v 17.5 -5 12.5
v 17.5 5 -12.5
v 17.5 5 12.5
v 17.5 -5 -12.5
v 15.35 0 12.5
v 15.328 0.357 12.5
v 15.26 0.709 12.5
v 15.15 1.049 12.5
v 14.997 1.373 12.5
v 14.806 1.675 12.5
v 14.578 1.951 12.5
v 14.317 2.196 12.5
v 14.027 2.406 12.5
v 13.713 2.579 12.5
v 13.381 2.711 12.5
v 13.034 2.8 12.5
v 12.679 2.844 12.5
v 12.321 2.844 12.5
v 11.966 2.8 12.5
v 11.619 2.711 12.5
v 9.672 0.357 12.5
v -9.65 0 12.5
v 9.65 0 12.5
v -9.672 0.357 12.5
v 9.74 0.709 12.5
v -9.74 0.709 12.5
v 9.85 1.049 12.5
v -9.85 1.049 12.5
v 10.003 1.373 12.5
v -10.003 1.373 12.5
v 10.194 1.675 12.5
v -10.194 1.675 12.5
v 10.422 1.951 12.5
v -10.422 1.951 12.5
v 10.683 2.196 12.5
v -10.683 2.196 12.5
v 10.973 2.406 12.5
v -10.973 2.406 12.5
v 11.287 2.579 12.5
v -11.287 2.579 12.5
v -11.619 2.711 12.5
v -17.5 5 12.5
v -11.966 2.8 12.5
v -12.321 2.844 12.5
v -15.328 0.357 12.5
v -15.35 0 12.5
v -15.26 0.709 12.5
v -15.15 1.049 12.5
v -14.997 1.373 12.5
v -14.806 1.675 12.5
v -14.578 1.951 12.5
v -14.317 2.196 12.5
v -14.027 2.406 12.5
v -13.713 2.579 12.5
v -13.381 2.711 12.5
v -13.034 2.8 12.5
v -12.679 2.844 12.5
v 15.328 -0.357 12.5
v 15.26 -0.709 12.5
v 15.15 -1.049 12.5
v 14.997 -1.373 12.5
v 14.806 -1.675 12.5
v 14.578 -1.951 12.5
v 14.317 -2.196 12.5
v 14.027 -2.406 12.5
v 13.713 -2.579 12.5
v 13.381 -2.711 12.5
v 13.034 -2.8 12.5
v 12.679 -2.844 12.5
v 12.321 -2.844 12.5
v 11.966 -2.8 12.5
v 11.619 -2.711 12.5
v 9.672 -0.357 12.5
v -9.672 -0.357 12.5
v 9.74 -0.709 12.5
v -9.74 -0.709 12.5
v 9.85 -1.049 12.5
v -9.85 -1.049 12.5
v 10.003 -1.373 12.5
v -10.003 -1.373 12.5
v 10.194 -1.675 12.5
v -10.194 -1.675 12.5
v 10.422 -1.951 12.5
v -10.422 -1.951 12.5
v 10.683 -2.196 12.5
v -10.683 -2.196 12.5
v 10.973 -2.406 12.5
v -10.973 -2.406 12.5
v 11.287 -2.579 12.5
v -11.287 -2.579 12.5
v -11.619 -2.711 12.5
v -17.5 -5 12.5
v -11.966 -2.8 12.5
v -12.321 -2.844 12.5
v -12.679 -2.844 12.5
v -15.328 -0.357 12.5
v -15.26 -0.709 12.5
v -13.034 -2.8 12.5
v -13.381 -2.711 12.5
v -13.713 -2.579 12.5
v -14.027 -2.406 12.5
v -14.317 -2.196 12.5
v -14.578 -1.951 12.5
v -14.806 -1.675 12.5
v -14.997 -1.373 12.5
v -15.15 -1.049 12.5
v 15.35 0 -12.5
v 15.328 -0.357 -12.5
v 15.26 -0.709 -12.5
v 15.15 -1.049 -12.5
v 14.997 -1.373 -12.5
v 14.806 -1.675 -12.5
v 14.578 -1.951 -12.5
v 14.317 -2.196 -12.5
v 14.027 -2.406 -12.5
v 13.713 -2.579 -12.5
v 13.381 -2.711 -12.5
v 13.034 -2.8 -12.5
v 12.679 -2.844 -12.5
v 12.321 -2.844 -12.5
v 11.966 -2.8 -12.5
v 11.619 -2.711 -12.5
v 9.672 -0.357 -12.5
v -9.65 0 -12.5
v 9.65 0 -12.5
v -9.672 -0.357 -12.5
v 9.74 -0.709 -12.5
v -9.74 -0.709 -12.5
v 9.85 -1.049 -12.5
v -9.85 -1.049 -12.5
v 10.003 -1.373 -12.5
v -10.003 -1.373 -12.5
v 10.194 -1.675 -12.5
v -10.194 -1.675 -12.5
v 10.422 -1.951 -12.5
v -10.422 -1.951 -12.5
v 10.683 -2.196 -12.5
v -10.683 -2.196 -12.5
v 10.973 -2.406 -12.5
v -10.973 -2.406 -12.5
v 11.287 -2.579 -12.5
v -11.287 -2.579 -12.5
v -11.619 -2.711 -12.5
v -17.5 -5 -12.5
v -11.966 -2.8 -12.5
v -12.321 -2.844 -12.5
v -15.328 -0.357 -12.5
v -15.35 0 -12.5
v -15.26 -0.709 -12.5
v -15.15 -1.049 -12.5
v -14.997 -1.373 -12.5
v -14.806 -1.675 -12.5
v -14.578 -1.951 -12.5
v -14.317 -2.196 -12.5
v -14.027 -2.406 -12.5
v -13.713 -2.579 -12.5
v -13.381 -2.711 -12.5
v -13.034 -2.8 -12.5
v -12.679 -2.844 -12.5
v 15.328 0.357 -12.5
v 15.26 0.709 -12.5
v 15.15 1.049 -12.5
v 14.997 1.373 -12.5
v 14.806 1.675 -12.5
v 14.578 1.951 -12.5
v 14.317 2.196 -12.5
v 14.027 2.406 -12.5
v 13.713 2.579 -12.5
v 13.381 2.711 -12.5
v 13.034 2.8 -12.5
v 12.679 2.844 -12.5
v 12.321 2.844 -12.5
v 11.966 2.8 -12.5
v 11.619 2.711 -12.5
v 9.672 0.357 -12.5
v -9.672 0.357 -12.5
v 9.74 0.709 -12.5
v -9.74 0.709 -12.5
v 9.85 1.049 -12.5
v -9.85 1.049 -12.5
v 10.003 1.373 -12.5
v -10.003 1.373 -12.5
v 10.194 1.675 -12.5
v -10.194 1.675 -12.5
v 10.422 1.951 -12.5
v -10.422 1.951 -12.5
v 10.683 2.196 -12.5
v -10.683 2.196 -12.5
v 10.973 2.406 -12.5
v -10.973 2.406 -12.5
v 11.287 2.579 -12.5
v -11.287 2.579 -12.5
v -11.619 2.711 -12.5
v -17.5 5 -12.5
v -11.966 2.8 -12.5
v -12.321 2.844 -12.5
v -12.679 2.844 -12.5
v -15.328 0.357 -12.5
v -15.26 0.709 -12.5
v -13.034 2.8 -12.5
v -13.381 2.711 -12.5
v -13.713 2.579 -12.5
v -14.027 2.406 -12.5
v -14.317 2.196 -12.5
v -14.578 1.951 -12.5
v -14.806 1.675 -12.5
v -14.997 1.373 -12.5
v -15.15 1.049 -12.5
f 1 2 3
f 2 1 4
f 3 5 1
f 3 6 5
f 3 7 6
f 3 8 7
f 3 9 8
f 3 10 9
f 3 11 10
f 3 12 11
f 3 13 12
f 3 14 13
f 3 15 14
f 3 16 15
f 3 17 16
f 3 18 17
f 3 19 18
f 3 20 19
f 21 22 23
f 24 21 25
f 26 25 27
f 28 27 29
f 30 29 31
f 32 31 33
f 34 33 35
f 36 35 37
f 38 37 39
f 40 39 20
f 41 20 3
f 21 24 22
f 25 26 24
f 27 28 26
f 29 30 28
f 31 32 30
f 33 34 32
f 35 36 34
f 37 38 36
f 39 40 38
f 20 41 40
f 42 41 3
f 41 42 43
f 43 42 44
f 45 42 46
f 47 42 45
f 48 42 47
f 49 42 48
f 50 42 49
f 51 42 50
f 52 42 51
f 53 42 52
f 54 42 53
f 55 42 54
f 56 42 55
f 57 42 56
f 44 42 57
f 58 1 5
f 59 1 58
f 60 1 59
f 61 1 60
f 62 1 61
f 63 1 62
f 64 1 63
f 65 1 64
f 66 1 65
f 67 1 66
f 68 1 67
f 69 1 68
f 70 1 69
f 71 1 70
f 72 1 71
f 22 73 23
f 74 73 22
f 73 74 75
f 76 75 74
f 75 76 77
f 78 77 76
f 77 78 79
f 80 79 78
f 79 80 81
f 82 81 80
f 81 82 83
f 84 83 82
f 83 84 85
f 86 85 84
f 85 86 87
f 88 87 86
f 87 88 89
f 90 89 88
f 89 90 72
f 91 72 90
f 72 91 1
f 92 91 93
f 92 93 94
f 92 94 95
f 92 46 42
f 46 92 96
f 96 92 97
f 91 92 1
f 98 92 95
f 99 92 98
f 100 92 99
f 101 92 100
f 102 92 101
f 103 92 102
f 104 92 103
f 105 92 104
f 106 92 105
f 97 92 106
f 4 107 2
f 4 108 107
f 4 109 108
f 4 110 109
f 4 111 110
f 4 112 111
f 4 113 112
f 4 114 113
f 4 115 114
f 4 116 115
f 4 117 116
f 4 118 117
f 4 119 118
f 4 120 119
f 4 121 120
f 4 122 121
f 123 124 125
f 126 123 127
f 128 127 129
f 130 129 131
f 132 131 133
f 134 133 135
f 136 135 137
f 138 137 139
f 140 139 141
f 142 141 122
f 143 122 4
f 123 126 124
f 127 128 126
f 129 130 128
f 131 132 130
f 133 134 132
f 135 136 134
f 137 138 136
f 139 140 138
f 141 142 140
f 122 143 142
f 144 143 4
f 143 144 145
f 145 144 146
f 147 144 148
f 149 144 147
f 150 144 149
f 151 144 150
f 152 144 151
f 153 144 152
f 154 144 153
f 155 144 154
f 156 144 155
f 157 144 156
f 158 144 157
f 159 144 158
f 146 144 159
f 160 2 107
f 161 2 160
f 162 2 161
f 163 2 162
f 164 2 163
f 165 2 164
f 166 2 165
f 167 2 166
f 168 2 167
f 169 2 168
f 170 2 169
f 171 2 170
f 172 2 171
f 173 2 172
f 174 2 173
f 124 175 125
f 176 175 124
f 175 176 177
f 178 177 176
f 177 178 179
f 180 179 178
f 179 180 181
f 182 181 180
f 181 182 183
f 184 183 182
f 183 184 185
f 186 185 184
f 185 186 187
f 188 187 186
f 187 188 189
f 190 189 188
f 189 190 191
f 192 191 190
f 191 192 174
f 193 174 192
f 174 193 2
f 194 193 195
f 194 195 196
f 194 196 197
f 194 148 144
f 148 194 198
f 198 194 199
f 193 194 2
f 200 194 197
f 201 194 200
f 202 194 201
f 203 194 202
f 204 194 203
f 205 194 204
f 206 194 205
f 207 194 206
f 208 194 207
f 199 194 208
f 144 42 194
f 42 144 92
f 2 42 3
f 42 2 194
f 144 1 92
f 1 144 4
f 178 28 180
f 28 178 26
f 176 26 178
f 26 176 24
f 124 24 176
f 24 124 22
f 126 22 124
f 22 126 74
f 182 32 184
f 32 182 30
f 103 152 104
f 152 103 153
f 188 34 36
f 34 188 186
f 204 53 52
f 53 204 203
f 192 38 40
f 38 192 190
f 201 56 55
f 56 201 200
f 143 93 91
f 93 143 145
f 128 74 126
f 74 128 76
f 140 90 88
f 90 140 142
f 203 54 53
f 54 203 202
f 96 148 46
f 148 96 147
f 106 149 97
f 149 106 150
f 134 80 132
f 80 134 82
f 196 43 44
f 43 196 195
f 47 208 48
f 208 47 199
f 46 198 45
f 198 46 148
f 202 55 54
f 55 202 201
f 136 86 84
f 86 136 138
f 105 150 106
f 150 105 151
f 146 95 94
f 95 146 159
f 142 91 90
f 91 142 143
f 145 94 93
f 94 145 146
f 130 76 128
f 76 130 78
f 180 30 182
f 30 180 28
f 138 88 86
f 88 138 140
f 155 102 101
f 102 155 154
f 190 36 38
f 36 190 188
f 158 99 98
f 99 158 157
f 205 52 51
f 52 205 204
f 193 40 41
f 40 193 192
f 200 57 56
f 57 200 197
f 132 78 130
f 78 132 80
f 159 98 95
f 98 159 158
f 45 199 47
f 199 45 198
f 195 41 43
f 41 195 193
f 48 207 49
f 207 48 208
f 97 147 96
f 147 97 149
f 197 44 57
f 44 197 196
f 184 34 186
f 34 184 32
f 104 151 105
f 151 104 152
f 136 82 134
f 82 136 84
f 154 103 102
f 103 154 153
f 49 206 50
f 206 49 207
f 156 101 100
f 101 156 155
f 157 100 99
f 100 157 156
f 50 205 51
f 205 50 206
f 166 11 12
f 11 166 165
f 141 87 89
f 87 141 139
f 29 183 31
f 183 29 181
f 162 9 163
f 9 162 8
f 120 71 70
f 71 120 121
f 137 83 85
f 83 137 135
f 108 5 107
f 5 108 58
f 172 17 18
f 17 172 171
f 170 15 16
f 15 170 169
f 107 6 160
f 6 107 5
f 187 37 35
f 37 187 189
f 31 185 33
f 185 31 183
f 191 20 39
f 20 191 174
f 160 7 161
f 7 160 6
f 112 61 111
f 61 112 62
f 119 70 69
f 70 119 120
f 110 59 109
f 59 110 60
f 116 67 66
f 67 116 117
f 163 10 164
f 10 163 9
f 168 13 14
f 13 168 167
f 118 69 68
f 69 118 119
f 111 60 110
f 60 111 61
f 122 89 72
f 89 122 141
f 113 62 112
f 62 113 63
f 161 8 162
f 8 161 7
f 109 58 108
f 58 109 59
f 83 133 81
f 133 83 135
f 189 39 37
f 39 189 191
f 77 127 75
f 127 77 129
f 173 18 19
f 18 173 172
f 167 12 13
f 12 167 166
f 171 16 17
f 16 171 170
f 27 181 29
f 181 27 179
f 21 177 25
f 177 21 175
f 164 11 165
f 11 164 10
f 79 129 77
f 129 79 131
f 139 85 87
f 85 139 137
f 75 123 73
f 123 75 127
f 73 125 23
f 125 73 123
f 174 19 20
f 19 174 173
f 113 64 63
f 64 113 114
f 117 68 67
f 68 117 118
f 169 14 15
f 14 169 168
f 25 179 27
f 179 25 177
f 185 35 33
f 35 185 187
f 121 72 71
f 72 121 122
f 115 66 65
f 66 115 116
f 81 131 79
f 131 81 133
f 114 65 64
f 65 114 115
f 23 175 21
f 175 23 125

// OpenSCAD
difference() {
	cube([35, 10, 25], true);
	translate([-25/2, 0, 0]) cylinder(h=100, r=5.7/2, $fn=50, center=true);
	translate([+25/2, 0, 0]) cylinder(h=100, r=5.7/2, $fn=50, center=true);
}
